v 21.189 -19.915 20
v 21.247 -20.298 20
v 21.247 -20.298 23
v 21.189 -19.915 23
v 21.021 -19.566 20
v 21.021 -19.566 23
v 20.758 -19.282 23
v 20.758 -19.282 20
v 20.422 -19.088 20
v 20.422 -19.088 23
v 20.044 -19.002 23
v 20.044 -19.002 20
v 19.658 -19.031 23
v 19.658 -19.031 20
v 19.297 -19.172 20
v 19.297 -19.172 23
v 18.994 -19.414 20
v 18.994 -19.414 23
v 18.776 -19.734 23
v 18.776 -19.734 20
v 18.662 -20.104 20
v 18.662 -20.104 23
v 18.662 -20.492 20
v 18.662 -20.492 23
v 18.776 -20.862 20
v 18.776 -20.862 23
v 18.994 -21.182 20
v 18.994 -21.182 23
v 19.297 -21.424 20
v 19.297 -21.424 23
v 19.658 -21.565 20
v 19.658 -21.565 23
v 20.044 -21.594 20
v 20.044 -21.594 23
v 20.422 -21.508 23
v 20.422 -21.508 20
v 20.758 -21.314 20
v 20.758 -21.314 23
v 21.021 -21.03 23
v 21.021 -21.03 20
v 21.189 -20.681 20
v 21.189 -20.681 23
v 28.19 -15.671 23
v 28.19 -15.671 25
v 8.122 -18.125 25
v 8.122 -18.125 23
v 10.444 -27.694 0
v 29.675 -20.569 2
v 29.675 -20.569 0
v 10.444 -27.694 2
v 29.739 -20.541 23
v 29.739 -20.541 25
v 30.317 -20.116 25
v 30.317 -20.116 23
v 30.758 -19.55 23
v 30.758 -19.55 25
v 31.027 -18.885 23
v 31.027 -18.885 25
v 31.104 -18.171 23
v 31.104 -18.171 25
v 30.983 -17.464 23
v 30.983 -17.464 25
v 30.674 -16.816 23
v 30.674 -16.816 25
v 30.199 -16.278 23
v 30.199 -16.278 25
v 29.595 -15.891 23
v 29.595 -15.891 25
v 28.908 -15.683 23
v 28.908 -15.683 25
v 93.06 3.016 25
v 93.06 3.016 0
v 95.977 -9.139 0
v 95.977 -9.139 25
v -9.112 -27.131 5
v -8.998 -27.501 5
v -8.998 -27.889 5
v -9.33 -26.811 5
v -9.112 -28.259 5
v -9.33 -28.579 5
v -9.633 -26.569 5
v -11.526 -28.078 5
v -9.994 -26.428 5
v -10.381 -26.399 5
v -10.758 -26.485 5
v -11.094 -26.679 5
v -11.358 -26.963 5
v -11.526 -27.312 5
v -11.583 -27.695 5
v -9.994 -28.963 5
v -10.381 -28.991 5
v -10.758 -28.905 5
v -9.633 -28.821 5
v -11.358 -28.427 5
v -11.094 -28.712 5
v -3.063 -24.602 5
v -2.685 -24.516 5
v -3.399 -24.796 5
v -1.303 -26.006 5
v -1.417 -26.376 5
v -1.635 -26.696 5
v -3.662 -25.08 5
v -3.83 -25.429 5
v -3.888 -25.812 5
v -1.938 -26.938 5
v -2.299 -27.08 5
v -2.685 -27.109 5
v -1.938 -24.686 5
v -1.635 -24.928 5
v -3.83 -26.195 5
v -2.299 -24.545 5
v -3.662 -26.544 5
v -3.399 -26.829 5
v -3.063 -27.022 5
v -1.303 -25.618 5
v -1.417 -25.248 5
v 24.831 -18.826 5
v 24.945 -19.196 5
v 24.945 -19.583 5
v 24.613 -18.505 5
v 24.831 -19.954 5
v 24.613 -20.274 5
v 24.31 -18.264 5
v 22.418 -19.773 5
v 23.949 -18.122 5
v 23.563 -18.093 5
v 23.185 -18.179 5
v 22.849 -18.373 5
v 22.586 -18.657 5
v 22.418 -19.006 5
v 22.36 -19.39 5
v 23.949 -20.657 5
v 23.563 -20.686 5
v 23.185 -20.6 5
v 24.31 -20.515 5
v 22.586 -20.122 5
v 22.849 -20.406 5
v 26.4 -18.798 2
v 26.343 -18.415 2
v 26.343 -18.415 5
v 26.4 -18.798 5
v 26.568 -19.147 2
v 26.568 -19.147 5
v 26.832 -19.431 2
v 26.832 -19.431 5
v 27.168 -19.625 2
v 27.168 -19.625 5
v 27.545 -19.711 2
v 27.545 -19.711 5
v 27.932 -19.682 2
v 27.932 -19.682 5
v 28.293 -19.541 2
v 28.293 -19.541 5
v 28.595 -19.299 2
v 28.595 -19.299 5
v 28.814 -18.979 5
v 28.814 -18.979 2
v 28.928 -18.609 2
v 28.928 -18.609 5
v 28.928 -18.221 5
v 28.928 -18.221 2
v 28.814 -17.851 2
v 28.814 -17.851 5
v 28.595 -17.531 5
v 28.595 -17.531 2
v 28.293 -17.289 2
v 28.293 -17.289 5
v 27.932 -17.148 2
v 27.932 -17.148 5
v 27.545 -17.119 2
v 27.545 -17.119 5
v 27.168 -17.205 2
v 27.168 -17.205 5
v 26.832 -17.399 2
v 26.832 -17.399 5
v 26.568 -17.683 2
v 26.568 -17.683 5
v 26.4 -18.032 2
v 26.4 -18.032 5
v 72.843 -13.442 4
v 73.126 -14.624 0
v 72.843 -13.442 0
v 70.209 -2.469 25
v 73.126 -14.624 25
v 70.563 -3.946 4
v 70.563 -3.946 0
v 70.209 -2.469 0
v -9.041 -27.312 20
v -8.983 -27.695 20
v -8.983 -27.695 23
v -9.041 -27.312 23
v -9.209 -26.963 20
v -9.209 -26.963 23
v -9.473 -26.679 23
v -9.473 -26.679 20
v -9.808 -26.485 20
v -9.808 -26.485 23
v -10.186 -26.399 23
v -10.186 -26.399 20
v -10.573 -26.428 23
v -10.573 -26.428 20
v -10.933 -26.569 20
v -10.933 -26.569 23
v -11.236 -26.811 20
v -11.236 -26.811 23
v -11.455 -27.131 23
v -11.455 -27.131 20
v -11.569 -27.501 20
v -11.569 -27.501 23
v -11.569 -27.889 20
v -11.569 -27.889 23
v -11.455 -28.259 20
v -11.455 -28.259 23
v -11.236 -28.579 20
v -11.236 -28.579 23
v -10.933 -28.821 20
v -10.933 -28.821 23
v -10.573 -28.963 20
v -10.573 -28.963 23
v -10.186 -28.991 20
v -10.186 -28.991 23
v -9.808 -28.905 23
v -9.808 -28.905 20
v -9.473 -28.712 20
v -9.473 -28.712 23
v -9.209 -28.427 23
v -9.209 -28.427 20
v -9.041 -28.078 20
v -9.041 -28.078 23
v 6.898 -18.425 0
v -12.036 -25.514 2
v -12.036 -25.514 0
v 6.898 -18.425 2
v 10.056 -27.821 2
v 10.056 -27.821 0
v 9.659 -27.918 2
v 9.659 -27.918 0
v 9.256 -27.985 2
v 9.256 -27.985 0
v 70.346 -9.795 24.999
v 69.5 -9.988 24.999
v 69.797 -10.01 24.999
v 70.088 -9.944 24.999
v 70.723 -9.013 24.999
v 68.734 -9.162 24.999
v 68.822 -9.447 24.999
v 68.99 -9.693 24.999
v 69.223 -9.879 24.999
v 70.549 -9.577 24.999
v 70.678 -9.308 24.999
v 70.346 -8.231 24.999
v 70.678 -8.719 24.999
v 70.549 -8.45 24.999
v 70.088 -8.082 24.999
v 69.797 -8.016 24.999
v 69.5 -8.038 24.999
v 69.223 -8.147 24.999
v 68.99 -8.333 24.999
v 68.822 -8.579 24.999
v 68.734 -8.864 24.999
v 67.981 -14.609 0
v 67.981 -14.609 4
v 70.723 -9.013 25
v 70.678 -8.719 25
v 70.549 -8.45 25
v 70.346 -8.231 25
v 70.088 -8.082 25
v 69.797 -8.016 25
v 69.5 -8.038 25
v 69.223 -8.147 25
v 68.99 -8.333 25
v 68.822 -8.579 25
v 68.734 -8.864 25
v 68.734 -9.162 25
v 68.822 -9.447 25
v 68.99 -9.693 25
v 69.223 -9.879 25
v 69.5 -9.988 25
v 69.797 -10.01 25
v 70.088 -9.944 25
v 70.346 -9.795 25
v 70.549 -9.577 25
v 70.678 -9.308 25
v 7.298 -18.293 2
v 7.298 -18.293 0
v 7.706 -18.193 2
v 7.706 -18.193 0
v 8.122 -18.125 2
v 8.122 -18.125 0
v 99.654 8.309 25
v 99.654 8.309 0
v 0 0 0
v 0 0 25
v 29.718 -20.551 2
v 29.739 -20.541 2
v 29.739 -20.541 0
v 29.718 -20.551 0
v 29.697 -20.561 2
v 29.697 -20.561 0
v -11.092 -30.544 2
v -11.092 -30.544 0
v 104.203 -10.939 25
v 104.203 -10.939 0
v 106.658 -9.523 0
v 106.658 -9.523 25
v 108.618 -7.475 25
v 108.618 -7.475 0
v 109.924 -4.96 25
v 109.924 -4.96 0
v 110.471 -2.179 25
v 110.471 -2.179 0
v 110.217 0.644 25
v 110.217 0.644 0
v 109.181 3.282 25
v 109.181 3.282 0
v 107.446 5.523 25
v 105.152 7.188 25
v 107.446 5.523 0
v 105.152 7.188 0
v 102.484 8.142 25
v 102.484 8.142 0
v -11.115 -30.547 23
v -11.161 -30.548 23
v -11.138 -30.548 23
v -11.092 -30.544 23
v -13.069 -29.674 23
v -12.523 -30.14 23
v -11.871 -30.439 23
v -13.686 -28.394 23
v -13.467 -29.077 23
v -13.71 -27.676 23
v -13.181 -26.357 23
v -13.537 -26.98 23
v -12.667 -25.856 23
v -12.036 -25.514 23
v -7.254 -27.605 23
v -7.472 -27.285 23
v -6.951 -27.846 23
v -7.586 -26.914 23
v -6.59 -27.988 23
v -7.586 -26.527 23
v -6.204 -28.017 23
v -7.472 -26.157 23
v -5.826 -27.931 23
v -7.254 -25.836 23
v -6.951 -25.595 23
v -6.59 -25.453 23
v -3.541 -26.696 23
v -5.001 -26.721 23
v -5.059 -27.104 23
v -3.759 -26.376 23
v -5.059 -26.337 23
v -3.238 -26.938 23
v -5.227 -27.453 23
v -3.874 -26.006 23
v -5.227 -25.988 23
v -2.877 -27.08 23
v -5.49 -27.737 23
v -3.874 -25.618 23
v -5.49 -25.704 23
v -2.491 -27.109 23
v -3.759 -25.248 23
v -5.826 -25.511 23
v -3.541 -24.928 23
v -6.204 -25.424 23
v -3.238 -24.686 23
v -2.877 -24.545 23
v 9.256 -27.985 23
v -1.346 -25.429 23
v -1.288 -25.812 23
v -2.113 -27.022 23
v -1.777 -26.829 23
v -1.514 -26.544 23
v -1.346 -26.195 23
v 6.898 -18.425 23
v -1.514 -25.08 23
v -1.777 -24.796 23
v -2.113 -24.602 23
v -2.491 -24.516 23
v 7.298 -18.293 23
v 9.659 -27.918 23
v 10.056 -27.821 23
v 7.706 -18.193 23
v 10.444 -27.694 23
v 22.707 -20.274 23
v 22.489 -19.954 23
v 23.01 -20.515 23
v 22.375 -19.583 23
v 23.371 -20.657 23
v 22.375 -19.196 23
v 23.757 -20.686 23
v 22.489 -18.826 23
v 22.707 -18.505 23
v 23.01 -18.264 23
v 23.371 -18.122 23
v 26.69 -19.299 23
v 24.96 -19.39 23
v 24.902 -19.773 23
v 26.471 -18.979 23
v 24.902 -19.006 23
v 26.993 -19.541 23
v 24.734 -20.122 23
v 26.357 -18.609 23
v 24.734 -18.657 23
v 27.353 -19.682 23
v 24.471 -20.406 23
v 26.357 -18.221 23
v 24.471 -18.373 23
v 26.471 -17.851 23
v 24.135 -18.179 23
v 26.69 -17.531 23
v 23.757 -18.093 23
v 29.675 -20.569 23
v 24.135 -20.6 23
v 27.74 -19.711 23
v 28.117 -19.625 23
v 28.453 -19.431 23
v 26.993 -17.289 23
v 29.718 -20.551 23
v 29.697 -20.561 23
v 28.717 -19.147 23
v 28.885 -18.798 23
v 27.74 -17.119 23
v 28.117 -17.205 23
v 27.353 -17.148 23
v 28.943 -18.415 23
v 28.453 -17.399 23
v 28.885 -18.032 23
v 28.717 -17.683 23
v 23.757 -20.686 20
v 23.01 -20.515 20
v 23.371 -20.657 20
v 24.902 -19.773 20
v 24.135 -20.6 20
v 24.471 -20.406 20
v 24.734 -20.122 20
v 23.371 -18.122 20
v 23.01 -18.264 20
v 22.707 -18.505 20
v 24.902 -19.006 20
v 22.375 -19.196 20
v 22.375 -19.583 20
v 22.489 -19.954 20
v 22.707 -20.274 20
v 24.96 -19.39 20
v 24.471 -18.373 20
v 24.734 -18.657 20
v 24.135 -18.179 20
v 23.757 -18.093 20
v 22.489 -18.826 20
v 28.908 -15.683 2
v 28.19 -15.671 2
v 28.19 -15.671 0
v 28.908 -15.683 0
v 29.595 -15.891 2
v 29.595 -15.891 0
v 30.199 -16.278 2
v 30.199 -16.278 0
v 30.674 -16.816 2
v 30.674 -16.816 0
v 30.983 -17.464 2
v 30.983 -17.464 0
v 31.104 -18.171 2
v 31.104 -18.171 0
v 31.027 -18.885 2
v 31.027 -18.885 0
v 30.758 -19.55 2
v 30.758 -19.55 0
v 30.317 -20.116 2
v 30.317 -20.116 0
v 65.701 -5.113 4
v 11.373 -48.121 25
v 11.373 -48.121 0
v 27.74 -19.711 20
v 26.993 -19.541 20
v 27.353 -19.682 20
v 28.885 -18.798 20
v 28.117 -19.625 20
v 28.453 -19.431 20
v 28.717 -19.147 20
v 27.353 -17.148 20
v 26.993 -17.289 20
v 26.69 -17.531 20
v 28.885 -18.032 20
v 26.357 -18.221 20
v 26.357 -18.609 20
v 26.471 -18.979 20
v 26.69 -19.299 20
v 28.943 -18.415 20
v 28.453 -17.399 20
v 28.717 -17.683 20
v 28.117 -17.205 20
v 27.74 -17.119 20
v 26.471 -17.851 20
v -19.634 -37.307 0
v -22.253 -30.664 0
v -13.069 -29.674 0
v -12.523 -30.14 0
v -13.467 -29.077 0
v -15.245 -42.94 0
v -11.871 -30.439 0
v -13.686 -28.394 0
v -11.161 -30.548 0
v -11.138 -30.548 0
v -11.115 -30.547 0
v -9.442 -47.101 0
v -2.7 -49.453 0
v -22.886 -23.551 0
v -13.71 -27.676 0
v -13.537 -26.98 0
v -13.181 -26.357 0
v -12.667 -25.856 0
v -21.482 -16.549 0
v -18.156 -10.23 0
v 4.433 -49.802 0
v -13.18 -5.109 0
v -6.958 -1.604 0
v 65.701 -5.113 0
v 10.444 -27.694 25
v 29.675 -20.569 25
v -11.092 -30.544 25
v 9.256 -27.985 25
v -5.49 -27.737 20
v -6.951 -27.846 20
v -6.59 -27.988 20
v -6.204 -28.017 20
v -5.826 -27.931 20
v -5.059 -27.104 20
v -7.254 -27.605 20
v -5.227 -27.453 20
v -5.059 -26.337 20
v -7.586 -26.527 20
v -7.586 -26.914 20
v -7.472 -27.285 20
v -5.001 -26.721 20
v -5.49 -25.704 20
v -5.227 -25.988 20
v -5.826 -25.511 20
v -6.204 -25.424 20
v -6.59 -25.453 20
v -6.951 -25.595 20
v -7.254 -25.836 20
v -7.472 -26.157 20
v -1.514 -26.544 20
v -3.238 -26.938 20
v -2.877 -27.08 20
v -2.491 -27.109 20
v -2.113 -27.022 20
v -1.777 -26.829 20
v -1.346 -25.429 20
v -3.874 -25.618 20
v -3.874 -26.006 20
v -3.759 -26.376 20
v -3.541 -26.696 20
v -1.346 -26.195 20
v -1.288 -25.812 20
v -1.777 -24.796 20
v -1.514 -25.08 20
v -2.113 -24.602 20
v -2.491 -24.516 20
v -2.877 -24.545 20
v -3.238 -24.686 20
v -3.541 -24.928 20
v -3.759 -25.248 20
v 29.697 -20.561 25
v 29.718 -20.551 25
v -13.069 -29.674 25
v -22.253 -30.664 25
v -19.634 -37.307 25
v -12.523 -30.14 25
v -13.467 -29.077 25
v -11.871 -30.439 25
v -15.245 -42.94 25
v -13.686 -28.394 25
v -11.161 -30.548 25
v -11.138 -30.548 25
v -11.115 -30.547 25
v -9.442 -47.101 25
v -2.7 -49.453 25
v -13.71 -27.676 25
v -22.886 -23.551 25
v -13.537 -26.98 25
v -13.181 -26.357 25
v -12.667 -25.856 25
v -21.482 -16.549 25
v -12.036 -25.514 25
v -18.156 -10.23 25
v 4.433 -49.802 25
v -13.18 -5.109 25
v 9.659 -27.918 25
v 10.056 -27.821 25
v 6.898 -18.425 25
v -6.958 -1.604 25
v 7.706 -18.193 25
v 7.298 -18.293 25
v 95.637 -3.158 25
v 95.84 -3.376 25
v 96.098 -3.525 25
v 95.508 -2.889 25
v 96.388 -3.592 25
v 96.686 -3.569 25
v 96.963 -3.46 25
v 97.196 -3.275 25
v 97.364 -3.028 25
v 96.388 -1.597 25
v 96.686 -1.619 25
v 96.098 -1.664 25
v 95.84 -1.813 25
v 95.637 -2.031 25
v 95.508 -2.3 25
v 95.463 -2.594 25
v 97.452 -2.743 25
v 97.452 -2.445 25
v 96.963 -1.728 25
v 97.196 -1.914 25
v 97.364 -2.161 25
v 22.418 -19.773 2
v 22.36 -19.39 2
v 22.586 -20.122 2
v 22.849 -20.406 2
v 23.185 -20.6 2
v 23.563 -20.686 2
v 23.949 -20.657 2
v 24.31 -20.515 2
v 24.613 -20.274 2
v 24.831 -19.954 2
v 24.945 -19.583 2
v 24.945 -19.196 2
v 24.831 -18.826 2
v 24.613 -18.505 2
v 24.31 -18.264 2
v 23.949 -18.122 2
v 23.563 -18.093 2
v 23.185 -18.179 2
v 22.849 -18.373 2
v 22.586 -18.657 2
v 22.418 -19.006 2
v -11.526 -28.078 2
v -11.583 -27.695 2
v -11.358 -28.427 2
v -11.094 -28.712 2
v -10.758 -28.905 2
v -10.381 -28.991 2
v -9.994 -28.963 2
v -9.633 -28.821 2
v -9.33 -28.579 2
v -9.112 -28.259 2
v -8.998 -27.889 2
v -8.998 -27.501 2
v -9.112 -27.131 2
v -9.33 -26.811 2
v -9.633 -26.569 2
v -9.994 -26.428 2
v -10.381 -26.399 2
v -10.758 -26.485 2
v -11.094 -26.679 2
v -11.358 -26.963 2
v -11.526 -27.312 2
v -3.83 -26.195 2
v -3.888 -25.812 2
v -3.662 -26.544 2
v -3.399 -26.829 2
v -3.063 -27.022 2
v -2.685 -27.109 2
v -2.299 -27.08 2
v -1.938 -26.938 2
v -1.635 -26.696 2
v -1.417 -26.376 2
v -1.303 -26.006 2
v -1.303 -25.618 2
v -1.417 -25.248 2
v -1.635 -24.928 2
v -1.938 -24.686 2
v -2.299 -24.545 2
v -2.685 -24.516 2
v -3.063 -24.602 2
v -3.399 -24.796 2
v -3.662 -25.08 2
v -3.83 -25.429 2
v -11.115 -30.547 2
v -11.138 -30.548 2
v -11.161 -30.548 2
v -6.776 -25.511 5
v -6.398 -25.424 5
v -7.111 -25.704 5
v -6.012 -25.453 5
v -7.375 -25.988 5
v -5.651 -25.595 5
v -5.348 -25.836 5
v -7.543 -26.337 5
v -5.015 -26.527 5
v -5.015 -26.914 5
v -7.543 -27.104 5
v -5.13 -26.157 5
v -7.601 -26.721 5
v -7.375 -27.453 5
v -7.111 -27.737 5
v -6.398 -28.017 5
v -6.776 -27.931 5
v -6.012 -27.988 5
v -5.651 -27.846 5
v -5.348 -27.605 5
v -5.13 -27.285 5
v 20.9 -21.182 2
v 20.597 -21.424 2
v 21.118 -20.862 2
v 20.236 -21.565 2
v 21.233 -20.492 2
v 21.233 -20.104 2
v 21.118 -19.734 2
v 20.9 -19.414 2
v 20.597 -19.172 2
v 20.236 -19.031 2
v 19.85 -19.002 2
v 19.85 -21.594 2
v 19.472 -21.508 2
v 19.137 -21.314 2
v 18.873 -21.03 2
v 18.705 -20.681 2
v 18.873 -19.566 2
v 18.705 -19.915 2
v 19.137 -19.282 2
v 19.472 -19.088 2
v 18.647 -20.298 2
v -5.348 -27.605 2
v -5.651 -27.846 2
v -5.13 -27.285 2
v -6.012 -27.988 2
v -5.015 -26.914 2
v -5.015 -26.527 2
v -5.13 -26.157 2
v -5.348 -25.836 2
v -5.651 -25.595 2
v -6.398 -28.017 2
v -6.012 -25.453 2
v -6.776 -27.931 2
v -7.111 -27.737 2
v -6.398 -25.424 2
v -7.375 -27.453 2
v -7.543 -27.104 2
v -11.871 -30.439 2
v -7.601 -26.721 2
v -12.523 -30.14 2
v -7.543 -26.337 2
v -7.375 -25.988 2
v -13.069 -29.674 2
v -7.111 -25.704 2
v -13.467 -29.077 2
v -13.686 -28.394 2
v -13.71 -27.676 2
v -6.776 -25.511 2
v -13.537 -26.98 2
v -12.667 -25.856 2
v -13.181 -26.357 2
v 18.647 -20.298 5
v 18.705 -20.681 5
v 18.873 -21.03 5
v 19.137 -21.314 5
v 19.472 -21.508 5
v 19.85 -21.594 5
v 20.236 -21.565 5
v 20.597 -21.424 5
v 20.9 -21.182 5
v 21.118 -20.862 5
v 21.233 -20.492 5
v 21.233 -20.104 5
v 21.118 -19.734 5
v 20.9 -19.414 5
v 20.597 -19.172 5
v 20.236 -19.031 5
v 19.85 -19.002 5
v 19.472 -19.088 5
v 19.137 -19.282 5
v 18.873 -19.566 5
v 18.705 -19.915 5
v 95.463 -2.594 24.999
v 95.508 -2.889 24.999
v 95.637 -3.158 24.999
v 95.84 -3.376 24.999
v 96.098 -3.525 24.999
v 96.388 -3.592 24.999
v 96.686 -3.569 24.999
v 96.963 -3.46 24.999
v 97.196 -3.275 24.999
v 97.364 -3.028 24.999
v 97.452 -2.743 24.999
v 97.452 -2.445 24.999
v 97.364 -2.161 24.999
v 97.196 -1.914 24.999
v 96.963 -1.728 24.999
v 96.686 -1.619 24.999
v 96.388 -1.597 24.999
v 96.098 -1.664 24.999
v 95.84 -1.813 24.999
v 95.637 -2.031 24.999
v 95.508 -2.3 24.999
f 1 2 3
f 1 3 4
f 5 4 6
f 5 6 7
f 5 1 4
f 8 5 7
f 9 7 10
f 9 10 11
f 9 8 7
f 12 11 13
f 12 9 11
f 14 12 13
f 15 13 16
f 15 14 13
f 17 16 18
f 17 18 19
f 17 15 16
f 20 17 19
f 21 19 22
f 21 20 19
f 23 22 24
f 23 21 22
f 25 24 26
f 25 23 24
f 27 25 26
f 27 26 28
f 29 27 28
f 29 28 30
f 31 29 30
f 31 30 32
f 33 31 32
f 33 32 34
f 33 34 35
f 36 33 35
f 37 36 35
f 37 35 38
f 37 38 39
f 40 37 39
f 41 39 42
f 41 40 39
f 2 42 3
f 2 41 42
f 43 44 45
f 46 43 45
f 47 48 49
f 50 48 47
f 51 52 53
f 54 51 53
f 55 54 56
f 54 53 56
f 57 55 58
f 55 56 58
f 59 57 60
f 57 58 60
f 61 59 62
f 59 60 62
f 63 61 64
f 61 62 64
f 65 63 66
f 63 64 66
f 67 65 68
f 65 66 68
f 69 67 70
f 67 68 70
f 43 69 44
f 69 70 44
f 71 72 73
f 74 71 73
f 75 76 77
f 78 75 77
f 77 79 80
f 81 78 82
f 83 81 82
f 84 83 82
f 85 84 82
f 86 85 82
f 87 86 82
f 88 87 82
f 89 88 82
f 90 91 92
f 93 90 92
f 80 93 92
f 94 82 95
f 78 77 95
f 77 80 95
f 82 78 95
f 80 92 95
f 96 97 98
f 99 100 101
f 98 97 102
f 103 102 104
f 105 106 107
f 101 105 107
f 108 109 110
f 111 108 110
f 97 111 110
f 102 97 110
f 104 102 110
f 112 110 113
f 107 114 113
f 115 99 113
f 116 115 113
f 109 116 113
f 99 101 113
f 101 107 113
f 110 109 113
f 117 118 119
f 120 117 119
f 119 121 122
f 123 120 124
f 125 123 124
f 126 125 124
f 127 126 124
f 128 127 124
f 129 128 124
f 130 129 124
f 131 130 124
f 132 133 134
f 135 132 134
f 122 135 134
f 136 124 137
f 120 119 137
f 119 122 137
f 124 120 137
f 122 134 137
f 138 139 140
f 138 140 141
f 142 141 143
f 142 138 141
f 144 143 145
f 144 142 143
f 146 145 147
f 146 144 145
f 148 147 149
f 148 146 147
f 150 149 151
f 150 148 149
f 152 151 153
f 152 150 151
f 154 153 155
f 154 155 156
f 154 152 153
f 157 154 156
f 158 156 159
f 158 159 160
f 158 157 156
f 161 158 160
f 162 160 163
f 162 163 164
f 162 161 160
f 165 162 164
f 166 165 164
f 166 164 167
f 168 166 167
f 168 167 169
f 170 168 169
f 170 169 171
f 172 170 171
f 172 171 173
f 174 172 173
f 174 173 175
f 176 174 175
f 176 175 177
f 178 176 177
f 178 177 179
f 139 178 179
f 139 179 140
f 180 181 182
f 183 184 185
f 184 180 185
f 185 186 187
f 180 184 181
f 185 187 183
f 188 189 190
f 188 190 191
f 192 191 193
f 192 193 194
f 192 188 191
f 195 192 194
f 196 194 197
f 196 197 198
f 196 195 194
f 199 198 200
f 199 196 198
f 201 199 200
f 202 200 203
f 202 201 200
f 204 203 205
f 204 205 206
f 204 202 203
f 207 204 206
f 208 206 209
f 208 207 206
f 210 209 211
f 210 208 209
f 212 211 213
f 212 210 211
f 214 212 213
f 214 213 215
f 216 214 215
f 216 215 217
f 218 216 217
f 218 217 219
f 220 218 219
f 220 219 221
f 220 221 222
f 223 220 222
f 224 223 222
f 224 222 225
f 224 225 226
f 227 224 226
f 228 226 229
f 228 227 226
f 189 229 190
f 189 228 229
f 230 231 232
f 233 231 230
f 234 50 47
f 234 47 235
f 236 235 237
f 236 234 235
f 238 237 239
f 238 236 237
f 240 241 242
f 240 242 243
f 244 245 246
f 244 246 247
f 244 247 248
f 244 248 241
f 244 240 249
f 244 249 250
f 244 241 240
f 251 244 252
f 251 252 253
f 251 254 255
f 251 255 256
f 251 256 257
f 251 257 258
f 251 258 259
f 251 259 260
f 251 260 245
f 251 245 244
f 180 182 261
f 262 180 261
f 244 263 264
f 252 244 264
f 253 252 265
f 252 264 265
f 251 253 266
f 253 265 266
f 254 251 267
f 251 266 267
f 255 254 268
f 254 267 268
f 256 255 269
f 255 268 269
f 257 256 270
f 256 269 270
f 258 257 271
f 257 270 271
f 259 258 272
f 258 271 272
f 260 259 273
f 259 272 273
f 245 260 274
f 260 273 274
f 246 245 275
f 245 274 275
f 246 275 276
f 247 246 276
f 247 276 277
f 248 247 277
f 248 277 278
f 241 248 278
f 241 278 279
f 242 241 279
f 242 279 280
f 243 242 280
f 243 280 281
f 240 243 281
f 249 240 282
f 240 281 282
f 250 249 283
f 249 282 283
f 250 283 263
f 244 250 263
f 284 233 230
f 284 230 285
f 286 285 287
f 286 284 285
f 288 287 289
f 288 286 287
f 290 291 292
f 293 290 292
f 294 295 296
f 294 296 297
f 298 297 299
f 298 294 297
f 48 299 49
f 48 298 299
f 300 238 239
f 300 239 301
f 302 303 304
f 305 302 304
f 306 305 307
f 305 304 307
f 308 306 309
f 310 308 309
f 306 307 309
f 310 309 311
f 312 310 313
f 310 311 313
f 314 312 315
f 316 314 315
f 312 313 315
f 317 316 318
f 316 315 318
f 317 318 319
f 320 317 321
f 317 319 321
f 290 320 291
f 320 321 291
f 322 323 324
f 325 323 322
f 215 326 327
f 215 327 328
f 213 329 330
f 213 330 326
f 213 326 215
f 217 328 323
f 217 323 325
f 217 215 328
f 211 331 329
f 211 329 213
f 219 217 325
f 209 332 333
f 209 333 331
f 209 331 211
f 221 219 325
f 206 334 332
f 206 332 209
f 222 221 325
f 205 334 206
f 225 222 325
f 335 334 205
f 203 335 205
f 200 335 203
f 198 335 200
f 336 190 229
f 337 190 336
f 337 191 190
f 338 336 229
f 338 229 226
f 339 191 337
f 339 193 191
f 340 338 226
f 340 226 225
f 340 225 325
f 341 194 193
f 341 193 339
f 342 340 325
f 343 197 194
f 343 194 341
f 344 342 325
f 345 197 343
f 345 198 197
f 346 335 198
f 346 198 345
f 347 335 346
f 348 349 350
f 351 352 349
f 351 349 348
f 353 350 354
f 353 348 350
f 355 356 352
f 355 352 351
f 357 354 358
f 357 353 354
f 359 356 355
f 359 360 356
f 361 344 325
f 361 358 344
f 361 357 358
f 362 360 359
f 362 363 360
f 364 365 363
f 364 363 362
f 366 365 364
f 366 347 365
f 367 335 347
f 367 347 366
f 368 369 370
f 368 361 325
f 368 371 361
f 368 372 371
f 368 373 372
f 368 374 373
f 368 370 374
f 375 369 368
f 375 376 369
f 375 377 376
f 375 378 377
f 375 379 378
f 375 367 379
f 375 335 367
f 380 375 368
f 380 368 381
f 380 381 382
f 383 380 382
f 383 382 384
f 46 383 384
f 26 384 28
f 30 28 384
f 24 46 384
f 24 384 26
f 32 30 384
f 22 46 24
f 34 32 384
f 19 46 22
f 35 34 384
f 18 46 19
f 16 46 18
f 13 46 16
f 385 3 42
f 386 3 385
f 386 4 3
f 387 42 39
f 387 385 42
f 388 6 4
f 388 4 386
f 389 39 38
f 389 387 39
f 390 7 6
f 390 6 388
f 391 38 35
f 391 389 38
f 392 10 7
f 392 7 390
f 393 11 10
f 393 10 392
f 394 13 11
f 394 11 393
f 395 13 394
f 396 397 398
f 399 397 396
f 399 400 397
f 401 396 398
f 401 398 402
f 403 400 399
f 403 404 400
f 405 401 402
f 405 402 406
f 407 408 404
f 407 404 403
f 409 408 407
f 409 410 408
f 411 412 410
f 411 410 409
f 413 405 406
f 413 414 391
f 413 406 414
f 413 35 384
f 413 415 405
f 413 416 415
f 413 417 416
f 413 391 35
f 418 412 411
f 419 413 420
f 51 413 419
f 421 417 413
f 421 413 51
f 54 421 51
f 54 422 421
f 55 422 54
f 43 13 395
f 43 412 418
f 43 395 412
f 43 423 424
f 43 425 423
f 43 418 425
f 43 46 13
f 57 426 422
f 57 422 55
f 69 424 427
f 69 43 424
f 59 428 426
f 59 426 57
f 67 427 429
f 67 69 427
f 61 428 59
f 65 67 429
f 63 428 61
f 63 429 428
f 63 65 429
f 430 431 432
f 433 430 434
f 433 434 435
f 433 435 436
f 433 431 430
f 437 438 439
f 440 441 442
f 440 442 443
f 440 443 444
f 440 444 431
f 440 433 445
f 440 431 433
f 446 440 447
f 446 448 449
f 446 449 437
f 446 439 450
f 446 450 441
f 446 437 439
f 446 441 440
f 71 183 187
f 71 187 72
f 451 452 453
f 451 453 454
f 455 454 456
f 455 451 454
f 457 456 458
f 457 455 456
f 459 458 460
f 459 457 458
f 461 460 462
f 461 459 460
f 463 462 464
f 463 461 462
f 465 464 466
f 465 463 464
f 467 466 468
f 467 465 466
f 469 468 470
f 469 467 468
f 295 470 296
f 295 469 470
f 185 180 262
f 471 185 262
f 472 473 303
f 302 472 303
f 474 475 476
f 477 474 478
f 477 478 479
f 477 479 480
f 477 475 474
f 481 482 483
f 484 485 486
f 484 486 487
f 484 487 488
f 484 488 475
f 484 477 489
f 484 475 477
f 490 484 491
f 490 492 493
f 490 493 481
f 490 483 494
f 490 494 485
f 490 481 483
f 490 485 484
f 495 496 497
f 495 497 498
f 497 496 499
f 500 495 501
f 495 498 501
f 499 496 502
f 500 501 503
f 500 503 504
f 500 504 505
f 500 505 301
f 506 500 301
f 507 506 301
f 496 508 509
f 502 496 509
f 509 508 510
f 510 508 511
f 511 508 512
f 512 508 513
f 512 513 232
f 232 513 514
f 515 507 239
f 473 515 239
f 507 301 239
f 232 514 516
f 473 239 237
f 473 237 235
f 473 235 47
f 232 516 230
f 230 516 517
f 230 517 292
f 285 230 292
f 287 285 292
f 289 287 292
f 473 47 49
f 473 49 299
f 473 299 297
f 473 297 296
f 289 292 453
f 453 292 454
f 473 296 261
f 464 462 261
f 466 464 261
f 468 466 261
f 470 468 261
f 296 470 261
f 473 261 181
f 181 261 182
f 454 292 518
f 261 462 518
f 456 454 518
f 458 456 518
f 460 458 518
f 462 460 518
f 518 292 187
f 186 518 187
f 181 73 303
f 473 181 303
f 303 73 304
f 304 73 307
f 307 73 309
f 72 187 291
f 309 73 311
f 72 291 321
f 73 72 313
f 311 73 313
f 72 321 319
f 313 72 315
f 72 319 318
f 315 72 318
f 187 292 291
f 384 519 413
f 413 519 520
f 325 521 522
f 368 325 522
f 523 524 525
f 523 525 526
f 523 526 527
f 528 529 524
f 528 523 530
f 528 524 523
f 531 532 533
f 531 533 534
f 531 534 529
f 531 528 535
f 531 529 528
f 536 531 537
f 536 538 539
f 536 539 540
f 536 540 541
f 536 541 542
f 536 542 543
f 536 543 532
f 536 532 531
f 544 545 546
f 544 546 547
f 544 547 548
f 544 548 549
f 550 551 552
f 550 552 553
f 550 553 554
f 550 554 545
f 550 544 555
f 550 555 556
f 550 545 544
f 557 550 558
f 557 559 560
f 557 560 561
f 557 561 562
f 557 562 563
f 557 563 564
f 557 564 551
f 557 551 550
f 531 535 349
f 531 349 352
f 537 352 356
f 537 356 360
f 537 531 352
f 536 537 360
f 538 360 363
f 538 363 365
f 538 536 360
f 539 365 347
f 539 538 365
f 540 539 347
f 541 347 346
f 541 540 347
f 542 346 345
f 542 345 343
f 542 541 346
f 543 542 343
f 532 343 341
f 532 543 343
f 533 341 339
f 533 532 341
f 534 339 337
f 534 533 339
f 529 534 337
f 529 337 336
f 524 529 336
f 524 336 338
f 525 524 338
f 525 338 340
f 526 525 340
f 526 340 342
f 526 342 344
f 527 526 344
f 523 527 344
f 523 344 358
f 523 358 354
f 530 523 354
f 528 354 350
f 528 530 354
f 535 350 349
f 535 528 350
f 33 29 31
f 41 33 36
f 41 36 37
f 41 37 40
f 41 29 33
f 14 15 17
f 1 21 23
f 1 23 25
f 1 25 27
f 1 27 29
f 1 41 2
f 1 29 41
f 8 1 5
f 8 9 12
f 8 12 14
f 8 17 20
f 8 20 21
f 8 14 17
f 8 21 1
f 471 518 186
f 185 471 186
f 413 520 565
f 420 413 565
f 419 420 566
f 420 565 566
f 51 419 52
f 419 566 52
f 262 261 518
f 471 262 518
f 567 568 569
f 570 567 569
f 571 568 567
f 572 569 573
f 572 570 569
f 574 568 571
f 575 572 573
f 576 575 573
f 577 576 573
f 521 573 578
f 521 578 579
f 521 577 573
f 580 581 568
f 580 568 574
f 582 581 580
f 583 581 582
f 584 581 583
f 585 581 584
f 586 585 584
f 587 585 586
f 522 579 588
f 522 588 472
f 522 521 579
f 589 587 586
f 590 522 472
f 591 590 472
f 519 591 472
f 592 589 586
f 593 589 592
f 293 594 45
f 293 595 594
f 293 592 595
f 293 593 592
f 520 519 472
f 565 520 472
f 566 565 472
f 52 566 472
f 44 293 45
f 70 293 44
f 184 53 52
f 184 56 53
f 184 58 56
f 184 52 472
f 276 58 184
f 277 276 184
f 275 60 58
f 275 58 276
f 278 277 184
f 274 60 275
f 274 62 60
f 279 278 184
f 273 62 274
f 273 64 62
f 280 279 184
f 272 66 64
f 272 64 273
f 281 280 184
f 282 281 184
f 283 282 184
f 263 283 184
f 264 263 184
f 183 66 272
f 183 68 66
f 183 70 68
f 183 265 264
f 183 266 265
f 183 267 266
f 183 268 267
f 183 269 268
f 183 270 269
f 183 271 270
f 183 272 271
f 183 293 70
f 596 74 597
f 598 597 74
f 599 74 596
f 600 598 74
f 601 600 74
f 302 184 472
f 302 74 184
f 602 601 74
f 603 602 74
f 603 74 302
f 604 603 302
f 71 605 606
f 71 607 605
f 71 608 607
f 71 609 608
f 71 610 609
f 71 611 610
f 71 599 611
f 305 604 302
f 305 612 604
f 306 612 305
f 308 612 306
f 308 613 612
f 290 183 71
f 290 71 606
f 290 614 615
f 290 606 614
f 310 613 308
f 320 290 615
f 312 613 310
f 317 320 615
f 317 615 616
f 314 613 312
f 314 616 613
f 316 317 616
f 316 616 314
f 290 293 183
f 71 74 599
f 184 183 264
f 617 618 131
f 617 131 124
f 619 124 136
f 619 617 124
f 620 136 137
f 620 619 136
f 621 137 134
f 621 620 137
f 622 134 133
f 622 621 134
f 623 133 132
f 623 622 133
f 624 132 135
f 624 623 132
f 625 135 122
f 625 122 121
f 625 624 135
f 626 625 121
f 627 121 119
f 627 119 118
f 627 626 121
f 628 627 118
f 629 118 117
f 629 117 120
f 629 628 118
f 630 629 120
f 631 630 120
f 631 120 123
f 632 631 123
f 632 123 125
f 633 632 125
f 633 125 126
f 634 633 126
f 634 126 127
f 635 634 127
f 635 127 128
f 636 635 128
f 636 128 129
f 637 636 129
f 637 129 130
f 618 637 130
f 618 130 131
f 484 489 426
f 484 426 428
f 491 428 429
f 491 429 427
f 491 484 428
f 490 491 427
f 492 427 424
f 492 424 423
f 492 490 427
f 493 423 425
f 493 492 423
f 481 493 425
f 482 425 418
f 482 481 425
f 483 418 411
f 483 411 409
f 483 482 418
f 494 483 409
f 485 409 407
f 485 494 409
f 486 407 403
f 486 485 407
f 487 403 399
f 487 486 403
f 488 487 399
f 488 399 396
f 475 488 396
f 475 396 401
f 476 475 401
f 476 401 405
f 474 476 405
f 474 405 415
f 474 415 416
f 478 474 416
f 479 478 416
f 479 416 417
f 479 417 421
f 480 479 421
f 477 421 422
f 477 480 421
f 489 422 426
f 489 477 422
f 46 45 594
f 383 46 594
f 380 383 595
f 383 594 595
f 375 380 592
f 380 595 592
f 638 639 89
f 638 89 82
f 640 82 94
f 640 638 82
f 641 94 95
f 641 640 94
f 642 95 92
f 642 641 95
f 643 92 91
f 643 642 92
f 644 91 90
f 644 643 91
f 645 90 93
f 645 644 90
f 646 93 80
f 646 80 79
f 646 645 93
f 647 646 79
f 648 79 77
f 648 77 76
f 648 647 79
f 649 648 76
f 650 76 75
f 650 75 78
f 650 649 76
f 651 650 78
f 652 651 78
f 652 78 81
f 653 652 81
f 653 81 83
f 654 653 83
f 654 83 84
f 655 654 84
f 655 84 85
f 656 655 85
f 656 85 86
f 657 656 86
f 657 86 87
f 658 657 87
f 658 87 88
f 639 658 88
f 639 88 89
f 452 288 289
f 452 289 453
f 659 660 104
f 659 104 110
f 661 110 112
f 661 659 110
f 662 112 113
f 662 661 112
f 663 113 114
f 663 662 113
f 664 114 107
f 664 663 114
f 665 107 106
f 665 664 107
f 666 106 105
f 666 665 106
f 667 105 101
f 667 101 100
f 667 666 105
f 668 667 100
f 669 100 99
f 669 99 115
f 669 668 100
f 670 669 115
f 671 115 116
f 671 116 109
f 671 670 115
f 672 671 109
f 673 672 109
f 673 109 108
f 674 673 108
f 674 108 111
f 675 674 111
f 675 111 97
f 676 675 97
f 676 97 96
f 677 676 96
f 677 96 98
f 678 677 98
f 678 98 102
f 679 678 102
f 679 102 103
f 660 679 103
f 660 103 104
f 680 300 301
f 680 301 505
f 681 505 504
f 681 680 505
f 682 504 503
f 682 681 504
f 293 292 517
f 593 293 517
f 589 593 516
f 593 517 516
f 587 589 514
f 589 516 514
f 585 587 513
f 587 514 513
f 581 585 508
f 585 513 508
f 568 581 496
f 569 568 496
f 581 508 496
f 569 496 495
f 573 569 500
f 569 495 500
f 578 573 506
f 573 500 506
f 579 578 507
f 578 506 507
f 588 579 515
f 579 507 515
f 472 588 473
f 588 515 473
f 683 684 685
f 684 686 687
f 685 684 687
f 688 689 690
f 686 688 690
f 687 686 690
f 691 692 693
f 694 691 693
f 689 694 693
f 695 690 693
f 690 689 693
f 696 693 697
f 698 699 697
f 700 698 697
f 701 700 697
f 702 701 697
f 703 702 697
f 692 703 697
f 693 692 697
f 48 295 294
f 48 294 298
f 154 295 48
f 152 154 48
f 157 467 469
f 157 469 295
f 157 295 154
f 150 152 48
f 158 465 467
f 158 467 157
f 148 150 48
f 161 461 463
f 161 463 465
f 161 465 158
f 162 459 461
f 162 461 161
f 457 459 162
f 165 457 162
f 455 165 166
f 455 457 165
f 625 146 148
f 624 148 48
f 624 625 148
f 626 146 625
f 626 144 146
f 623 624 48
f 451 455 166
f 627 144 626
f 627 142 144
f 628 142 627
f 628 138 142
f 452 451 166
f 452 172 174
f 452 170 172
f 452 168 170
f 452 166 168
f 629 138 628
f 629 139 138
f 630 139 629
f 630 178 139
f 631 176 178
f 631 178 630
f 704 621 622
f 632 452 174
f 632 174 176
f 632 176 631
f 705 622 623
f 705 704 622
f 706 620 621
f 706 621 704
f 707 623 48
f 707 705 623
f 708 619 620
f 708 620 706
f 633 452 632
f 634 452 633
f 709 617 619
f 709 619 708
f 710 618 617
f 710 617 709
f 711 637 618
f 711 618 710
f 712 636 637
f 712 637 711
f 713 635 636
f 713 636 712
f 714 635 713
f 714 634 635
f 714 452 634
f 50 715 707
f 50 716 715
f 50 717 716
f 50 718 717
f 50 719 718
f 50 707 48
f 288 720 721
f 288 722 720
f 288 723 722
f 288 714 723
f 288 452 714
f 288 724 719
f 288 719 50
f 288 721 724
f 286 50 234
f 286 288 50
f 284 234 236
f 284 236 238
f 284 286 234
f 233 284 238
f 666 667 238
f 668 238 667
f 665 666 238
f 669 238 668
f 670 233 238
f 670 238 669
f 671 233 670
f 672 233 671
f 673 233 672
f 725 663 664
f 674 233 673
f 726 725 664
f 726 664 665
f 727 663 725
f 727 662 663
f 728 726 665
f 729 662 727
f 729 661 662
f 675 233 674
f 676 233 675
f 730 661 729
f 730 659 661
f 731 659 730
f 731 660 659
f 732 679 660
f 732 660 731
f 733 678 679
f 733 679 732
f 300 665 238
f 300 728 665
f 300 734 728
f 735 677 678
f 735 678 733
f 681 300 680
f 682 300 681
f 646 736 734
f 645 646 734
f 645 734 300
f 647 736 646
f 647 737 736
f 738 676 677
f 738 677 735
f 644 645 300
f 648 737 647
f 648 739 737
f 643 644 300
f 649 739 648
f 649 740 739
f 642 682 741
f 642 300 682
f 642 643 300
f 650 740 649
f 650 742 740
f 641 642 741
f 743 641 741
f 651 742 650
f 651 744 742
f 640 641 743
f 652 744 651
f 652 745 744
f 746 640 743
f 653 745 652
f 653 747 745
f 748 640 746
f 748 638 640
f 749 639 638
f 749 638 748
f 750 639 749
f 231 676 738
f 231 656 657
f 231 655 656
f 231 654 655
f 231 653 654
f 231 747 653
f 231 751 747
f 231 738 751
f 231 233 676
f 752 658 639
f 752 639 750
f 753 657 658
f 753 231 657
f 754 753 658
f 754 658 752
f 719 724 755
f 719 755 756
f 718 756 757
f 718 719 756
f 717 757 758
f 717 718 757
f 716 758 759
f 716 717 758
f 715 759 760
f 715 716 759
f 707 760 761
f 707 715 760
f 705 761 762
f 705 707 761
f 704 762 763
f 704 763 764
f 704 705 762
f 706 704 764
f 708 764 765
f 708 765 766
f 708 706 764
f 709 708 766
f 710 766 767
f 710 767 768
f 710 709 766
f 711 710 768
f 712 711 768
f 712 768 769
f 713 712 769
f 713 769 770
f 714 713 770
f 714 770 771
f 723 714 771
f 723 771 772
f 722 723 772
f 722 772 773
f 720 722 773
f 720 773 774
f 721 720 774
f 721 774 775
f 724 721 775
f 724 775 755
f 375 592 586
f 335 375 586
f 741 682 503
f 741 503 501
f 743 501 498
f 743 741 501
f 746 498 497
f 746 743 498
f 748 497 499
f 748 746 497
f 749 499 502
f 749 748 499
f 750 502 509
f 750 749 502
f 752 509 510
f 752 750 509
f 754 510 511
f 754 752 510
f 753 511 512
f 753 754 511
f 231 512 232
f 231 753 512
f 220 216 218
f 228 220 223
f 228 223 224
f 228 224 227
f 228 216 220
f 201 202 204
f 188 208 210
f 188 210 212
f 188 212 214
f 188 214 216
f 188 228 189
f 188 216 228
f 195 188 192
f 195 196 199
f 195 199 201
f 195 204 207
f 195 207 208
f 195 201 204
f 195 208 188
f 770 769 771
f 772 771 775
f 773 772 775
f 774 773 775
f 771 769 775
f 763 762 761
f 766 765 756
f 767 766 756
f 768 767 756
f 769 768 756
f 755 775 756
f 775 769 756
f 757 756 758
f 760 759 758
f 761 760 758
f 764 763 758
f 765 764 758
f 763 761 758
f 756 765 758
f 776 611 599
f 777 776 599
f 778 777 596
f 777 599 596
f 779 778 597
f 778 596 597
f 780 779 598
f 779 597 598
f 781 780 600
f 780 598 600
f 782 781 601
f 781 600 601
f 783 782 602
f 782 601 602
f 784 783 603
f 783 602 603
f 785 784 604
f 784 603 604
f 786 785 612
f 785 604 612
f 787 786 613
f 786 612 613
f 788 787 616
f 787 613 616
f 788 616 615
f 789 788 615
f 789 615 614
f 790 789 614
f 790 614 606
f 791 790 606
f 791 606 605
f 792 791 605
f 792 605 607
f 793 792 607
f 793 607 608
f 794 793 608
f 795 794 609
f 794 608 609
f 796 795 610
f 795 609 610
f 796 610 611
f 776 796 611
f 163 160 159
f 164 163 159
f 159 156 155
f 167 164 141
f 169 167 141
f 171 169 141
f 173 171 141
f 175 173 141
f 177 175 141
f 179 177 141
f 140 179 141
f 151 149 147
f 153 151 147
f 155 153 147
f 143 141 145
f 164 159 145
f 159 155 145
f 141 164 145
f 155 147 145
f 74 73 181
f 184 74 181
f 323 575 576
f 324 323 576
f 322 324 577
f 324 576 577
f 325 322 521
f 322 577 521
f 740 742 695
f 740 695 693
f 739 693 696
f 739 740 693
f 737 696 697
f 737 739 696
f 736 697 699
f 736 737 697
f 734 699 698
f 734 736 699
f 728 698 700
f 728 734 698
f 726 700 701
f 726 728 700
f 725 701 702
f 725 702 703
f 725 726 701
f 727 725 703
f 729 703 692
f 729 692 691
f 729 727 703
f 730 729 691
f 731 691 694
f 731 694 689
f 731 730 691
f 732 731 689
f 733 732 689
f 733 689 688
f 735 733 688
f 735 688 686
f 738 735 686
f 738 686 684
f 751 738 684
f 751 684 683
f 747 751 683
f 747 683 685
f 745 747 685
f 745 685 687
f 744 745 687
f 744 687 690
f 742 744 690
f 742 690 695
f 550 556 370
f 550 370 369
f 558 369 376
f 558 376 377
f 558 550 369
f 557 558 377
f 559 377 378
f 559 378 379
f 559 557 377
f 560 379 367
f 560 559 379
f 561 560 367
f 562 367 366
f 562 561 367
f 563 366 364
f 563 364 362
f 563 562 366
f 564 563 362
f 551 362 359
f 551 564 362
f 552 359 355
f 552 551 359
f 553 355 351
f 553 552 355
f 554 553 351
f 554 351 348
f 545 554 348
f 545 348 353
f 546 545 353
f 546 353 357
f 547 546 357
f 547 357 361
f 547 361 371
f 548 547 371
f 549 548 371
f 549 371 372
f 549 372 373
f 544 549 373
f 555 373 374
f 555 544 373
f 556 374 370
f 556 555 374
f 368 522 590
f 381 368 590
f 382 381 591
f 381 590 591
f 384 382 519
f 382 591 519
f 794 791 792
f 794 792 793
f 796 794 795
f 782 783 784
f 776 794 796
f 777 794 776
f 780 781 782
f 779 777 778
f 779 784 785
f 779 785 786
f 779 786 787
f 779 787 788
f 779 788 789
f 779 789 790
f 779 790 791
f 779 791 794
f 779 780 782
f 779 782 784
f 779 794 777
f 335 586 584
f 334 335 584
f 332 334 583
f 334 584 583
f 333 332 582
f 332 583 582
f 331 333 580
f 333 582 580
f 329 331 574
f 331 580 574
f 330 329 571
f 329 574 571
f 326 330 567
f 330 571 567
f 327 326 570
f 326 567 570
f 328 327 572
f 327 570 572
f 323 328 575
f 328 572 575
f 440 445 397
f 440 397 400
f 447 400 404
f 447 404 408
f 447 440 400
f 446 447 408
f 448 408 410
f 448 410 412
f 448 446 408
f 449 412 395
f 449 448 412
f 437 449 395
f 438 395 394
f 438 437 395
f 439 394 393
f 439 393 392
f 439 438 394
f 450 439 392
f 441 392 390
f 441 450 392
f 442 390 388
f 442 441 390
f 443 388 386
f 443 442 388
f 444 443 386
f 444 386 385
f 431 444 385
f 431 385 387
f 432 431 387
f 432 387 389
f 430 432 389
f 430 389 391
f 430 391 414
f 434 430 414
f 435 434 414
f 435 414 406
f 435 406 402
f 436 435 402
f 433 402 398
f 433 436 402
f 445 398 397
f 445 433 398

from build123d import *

# Parameters (mm, degrees)
EXTRUDE_3_DEPTH          = 25
CUT_EXTRUDE_6_DEPTH      = 25
SKETCH_9_R               = 1
CUT_EXTRUDE_11_DEPTH     = 0.001
CUT_EXTRUDE_12_DEPTH     = 4
CUT_EXTRUDE_17_DEPTH     = 2
CUT_EXTRUDE_START        = 2
CUT_EXTRUDE_18_DEPTH     = 2
CUT_EXTRUDE_START_2      = 20
CUT_EXTRUDE_19_OUTLINE_R = 1.3
CUT_EXTRUDE_19_DEPTH     = 3
SKETCH_4_20_R            = 1.3
CUT_EXTRUDE_20_DEPTH     = 5


# Read off the part's stored shape, not the designer's step: 切除-拉伸19
with BuildPart() as part:
    # 草图7 → 凸台-拉伸3 (new body)
    with BuildSketch(Plane.XY):
        with BuildLine():
            Line((99.654203795, 8.309011134), (0, 0))
            ThreePointArc((0, 0), (-22.25252281, -30.663509172), (11.372685429, -48.121199083))
            Line((11.372685429, -48.121199083), (104.203277967, -10.939468499))
            ThreePointArc((104.203277967, -10.939468499), (110.217015146, 0.643574044), (99.654203795, 8.309011134))
        make_face()
    extrude(amount=EXTRUDE_3_DEPTH)

    # 草图3 → 切除-拉伸6 (cut)
    with BuildSketch(Plane.XY):
        Polygon((95.977186606, -9.138607998), (73.126313538, -14.623824499), (70.208645187, -2.469104782), (93.059518254, 3.016111719), align=None)
    extrude(amount=CUT_EXTRUDE_6_DEPTH, mode=Mode.SUBTRACT)

    # 草图9 → 切除-拉伸11 (cut)
    with BuildSketch(Plane.XY.offset(25)):
        with Locations((69.722724208, -9.013291577)):
            Circle(SKETCH_9_R)
        with Locations(Location((96.463107585, -2.594421203, 0), (0, 0, 180))):
            Circle(SKETCH_9_R)
    extrude(amount=-CUT_EXTRUDE_11_DEPTH, mode=Mode.SUBTRACT)

    # 草图3<11> → 切除-拉伸12 (cut)
    with BuildSketch(Plane.XY):
        Polygon((72.842644051, -13.442085282), (67.980756164, -14.609152622), (65.701162058, -5.112587525), (70.563049944, -3.945520185), align=None)
    extrude(amount=CUT_EXTRUDE_12_DEPTH, mode=Mode.SUBTRACT)

    # Sketch 3D_5 → 切除-拉伸17 (cut)
    with BuildSketch(Plane(origin=(10.444215818, -27.693919668, 25), x_dir=(-0.9953297932940416, 0.09653290931718772, 0), z_dir=(0, 0, -1))):
        with BuildLine():
            Line((0, 0), (-18.453401997, 8.947839585))
            ThreePointArc((-18.453401997, 8.947839585), (-18.48417706, 8.964108788), (-18.513745535, 8.982479872))
            ThreePointArc((-18.513745535, 8.982479872), (-19.45567303, 12.165265617), (-16.502248474, 13.680071182))
            Line((-16.502248474, 13.680071182), (3.235389304, 9.299601756))
            ThreePointArc((3.235389304, 9.299601756), (3.842109592, 9.12676054), (4.424199035, 8.883541558))
            Line((4.424199035, 8.883541558), (22.585849479, 0))
            ThreePointArc((22.585849479, 0), (23.950111663, -3.025911631), (21.229027313, -4.926714742))
            ThreePointArc((21.229027313, -4.926714742), (21.194456039, -4.922638166), (21.160252198, -4.916166022))
            Line((21.160252198, -4.916166022), (1.154440034, -0.404031474))
            ThreePointArc((1.154440034, -0.404031474), (0.56560873, -0.235192692), (0, 0))
        make_face()
    extrude(amount=CUT_EXTRUDE_17_DEPTH, mode=Mode.SUBTRACT)

    # 草图4<19> → 切除-拉伸18 (cut)
    with BuildSketch(Plane.XY.offset(CUT_EXTRUDE_START)):
        with BuildLine():
            Line((29.675197601, -20.569228925), (10.444215818, -27.693919668))
            ThreePointArc((10.444215818, -27.693919668), (9.858544762, -27.873414105), (9.256164924, -27.984622777))
            Line((9.256164924, -27.984622777), (-11.091785437, -30.544465472))
            ThreePointArc((-11.091785437, -30.544465472), (-11.126454314, -30.547605594), (-11.161257657, -30.548325866))
            ThreePointArc((-11.161257657, -30.548325866), (-13.686143926, -28.393725709), (-12.036153076, -25.513641909))
            Line((-12.036153076, -25.513641909), (6.898232818, -18.424785281))
            ThreePointArc((6.898232818, -18.424785281), (7.50108242, -18.23889297), (8.121654063, -18.125427433))
            Line((8.121654063, -18.125427433), (28.189972451, -15.670747301))
            ThreePointArc((28.189972451, -15.670747301), (30.983375316, -17.463581076), (29.738603249, -20.540575553))
            ThreePointArc((29.738603249, -20.540575553), (29.707399451, -20.556006509), (29.675197601, -20.569228925))
        make_face()
    extrude(amount=-CUT_EXTRUDE_18_DEPTH, mode=Mode.SUBTRACT)

    # 切除-拉伸19 outline → 切除-拉伸19 (cut)
    with BuildSketch(Plane.XY.offset(CUT_EXTRUDE_START_2)):
        with Locations((27.642515471, -18.415074729)):
            Circle(CUT_EXTRUDE_19_OUTLINE_R)
        with Locations((23.660004397, -19.389551795)):
            Circle(CUT_EXTRUDE_19_OUTLINE_R)
        with Locations((19.947149108, -20.298047028)):
            Circle(CUT_EXTRUDE_19_OUTLINE_R)
        with Locations((-2.588035502, -25.812161156)):
            Circle(CUT_EXTRUDE_19_OUTLINE_R)
        with Locations((-6.300890791, -26.72065639)):
            Circle(CUT_EXTRUDE_19_OUTLINE_R)
        with Locations((-10.283401864, -27.695133455)):
            Circle(CUT_EXTRUDE_19_OUTLINE_R)
    extrude(amount=CUT_EXTRUDE_19_DEPTH, mode=Mode.SUBTRACT)

    # 草图4<20> → 切除-拉伸20 (cut)
    with BuildSketch(Plane.XY):
        with Locations(Location((-2.588035502, -25.812161156, 0), (0, 0, 180))):
            Circle(SKETCH_4_20_R)
        with Locations(Location((27.642515471, -18.415074729, 0), (0, 0, 180))):
            Circle(SKETCH_4_20_R)
        with Locations(Location((23.660004397, -19.389551795, 0), (0, 0, 180))):
            Circle(SKETCH_4_20_R)
        with Locations(Location((19.947149108, -20.298047028, 0), (0, 0, 180))):
            Circle(SKETCH_4_20_R)
        with Locations(Location((-6.300890791, -26.72065639, 0), (0, 0, 180))):
            Circle(SKETCH_4_20_R)
        with Locations(Location((-10.283401864, -27.695133455, 0), (0, 0, 180))):
            Circle(SKETCH_4_20_R)
    extrude(amount=CUT_EXTRUDE_20_DEPTH, mode=Mode.SUBTRACT)


solid = part.part
